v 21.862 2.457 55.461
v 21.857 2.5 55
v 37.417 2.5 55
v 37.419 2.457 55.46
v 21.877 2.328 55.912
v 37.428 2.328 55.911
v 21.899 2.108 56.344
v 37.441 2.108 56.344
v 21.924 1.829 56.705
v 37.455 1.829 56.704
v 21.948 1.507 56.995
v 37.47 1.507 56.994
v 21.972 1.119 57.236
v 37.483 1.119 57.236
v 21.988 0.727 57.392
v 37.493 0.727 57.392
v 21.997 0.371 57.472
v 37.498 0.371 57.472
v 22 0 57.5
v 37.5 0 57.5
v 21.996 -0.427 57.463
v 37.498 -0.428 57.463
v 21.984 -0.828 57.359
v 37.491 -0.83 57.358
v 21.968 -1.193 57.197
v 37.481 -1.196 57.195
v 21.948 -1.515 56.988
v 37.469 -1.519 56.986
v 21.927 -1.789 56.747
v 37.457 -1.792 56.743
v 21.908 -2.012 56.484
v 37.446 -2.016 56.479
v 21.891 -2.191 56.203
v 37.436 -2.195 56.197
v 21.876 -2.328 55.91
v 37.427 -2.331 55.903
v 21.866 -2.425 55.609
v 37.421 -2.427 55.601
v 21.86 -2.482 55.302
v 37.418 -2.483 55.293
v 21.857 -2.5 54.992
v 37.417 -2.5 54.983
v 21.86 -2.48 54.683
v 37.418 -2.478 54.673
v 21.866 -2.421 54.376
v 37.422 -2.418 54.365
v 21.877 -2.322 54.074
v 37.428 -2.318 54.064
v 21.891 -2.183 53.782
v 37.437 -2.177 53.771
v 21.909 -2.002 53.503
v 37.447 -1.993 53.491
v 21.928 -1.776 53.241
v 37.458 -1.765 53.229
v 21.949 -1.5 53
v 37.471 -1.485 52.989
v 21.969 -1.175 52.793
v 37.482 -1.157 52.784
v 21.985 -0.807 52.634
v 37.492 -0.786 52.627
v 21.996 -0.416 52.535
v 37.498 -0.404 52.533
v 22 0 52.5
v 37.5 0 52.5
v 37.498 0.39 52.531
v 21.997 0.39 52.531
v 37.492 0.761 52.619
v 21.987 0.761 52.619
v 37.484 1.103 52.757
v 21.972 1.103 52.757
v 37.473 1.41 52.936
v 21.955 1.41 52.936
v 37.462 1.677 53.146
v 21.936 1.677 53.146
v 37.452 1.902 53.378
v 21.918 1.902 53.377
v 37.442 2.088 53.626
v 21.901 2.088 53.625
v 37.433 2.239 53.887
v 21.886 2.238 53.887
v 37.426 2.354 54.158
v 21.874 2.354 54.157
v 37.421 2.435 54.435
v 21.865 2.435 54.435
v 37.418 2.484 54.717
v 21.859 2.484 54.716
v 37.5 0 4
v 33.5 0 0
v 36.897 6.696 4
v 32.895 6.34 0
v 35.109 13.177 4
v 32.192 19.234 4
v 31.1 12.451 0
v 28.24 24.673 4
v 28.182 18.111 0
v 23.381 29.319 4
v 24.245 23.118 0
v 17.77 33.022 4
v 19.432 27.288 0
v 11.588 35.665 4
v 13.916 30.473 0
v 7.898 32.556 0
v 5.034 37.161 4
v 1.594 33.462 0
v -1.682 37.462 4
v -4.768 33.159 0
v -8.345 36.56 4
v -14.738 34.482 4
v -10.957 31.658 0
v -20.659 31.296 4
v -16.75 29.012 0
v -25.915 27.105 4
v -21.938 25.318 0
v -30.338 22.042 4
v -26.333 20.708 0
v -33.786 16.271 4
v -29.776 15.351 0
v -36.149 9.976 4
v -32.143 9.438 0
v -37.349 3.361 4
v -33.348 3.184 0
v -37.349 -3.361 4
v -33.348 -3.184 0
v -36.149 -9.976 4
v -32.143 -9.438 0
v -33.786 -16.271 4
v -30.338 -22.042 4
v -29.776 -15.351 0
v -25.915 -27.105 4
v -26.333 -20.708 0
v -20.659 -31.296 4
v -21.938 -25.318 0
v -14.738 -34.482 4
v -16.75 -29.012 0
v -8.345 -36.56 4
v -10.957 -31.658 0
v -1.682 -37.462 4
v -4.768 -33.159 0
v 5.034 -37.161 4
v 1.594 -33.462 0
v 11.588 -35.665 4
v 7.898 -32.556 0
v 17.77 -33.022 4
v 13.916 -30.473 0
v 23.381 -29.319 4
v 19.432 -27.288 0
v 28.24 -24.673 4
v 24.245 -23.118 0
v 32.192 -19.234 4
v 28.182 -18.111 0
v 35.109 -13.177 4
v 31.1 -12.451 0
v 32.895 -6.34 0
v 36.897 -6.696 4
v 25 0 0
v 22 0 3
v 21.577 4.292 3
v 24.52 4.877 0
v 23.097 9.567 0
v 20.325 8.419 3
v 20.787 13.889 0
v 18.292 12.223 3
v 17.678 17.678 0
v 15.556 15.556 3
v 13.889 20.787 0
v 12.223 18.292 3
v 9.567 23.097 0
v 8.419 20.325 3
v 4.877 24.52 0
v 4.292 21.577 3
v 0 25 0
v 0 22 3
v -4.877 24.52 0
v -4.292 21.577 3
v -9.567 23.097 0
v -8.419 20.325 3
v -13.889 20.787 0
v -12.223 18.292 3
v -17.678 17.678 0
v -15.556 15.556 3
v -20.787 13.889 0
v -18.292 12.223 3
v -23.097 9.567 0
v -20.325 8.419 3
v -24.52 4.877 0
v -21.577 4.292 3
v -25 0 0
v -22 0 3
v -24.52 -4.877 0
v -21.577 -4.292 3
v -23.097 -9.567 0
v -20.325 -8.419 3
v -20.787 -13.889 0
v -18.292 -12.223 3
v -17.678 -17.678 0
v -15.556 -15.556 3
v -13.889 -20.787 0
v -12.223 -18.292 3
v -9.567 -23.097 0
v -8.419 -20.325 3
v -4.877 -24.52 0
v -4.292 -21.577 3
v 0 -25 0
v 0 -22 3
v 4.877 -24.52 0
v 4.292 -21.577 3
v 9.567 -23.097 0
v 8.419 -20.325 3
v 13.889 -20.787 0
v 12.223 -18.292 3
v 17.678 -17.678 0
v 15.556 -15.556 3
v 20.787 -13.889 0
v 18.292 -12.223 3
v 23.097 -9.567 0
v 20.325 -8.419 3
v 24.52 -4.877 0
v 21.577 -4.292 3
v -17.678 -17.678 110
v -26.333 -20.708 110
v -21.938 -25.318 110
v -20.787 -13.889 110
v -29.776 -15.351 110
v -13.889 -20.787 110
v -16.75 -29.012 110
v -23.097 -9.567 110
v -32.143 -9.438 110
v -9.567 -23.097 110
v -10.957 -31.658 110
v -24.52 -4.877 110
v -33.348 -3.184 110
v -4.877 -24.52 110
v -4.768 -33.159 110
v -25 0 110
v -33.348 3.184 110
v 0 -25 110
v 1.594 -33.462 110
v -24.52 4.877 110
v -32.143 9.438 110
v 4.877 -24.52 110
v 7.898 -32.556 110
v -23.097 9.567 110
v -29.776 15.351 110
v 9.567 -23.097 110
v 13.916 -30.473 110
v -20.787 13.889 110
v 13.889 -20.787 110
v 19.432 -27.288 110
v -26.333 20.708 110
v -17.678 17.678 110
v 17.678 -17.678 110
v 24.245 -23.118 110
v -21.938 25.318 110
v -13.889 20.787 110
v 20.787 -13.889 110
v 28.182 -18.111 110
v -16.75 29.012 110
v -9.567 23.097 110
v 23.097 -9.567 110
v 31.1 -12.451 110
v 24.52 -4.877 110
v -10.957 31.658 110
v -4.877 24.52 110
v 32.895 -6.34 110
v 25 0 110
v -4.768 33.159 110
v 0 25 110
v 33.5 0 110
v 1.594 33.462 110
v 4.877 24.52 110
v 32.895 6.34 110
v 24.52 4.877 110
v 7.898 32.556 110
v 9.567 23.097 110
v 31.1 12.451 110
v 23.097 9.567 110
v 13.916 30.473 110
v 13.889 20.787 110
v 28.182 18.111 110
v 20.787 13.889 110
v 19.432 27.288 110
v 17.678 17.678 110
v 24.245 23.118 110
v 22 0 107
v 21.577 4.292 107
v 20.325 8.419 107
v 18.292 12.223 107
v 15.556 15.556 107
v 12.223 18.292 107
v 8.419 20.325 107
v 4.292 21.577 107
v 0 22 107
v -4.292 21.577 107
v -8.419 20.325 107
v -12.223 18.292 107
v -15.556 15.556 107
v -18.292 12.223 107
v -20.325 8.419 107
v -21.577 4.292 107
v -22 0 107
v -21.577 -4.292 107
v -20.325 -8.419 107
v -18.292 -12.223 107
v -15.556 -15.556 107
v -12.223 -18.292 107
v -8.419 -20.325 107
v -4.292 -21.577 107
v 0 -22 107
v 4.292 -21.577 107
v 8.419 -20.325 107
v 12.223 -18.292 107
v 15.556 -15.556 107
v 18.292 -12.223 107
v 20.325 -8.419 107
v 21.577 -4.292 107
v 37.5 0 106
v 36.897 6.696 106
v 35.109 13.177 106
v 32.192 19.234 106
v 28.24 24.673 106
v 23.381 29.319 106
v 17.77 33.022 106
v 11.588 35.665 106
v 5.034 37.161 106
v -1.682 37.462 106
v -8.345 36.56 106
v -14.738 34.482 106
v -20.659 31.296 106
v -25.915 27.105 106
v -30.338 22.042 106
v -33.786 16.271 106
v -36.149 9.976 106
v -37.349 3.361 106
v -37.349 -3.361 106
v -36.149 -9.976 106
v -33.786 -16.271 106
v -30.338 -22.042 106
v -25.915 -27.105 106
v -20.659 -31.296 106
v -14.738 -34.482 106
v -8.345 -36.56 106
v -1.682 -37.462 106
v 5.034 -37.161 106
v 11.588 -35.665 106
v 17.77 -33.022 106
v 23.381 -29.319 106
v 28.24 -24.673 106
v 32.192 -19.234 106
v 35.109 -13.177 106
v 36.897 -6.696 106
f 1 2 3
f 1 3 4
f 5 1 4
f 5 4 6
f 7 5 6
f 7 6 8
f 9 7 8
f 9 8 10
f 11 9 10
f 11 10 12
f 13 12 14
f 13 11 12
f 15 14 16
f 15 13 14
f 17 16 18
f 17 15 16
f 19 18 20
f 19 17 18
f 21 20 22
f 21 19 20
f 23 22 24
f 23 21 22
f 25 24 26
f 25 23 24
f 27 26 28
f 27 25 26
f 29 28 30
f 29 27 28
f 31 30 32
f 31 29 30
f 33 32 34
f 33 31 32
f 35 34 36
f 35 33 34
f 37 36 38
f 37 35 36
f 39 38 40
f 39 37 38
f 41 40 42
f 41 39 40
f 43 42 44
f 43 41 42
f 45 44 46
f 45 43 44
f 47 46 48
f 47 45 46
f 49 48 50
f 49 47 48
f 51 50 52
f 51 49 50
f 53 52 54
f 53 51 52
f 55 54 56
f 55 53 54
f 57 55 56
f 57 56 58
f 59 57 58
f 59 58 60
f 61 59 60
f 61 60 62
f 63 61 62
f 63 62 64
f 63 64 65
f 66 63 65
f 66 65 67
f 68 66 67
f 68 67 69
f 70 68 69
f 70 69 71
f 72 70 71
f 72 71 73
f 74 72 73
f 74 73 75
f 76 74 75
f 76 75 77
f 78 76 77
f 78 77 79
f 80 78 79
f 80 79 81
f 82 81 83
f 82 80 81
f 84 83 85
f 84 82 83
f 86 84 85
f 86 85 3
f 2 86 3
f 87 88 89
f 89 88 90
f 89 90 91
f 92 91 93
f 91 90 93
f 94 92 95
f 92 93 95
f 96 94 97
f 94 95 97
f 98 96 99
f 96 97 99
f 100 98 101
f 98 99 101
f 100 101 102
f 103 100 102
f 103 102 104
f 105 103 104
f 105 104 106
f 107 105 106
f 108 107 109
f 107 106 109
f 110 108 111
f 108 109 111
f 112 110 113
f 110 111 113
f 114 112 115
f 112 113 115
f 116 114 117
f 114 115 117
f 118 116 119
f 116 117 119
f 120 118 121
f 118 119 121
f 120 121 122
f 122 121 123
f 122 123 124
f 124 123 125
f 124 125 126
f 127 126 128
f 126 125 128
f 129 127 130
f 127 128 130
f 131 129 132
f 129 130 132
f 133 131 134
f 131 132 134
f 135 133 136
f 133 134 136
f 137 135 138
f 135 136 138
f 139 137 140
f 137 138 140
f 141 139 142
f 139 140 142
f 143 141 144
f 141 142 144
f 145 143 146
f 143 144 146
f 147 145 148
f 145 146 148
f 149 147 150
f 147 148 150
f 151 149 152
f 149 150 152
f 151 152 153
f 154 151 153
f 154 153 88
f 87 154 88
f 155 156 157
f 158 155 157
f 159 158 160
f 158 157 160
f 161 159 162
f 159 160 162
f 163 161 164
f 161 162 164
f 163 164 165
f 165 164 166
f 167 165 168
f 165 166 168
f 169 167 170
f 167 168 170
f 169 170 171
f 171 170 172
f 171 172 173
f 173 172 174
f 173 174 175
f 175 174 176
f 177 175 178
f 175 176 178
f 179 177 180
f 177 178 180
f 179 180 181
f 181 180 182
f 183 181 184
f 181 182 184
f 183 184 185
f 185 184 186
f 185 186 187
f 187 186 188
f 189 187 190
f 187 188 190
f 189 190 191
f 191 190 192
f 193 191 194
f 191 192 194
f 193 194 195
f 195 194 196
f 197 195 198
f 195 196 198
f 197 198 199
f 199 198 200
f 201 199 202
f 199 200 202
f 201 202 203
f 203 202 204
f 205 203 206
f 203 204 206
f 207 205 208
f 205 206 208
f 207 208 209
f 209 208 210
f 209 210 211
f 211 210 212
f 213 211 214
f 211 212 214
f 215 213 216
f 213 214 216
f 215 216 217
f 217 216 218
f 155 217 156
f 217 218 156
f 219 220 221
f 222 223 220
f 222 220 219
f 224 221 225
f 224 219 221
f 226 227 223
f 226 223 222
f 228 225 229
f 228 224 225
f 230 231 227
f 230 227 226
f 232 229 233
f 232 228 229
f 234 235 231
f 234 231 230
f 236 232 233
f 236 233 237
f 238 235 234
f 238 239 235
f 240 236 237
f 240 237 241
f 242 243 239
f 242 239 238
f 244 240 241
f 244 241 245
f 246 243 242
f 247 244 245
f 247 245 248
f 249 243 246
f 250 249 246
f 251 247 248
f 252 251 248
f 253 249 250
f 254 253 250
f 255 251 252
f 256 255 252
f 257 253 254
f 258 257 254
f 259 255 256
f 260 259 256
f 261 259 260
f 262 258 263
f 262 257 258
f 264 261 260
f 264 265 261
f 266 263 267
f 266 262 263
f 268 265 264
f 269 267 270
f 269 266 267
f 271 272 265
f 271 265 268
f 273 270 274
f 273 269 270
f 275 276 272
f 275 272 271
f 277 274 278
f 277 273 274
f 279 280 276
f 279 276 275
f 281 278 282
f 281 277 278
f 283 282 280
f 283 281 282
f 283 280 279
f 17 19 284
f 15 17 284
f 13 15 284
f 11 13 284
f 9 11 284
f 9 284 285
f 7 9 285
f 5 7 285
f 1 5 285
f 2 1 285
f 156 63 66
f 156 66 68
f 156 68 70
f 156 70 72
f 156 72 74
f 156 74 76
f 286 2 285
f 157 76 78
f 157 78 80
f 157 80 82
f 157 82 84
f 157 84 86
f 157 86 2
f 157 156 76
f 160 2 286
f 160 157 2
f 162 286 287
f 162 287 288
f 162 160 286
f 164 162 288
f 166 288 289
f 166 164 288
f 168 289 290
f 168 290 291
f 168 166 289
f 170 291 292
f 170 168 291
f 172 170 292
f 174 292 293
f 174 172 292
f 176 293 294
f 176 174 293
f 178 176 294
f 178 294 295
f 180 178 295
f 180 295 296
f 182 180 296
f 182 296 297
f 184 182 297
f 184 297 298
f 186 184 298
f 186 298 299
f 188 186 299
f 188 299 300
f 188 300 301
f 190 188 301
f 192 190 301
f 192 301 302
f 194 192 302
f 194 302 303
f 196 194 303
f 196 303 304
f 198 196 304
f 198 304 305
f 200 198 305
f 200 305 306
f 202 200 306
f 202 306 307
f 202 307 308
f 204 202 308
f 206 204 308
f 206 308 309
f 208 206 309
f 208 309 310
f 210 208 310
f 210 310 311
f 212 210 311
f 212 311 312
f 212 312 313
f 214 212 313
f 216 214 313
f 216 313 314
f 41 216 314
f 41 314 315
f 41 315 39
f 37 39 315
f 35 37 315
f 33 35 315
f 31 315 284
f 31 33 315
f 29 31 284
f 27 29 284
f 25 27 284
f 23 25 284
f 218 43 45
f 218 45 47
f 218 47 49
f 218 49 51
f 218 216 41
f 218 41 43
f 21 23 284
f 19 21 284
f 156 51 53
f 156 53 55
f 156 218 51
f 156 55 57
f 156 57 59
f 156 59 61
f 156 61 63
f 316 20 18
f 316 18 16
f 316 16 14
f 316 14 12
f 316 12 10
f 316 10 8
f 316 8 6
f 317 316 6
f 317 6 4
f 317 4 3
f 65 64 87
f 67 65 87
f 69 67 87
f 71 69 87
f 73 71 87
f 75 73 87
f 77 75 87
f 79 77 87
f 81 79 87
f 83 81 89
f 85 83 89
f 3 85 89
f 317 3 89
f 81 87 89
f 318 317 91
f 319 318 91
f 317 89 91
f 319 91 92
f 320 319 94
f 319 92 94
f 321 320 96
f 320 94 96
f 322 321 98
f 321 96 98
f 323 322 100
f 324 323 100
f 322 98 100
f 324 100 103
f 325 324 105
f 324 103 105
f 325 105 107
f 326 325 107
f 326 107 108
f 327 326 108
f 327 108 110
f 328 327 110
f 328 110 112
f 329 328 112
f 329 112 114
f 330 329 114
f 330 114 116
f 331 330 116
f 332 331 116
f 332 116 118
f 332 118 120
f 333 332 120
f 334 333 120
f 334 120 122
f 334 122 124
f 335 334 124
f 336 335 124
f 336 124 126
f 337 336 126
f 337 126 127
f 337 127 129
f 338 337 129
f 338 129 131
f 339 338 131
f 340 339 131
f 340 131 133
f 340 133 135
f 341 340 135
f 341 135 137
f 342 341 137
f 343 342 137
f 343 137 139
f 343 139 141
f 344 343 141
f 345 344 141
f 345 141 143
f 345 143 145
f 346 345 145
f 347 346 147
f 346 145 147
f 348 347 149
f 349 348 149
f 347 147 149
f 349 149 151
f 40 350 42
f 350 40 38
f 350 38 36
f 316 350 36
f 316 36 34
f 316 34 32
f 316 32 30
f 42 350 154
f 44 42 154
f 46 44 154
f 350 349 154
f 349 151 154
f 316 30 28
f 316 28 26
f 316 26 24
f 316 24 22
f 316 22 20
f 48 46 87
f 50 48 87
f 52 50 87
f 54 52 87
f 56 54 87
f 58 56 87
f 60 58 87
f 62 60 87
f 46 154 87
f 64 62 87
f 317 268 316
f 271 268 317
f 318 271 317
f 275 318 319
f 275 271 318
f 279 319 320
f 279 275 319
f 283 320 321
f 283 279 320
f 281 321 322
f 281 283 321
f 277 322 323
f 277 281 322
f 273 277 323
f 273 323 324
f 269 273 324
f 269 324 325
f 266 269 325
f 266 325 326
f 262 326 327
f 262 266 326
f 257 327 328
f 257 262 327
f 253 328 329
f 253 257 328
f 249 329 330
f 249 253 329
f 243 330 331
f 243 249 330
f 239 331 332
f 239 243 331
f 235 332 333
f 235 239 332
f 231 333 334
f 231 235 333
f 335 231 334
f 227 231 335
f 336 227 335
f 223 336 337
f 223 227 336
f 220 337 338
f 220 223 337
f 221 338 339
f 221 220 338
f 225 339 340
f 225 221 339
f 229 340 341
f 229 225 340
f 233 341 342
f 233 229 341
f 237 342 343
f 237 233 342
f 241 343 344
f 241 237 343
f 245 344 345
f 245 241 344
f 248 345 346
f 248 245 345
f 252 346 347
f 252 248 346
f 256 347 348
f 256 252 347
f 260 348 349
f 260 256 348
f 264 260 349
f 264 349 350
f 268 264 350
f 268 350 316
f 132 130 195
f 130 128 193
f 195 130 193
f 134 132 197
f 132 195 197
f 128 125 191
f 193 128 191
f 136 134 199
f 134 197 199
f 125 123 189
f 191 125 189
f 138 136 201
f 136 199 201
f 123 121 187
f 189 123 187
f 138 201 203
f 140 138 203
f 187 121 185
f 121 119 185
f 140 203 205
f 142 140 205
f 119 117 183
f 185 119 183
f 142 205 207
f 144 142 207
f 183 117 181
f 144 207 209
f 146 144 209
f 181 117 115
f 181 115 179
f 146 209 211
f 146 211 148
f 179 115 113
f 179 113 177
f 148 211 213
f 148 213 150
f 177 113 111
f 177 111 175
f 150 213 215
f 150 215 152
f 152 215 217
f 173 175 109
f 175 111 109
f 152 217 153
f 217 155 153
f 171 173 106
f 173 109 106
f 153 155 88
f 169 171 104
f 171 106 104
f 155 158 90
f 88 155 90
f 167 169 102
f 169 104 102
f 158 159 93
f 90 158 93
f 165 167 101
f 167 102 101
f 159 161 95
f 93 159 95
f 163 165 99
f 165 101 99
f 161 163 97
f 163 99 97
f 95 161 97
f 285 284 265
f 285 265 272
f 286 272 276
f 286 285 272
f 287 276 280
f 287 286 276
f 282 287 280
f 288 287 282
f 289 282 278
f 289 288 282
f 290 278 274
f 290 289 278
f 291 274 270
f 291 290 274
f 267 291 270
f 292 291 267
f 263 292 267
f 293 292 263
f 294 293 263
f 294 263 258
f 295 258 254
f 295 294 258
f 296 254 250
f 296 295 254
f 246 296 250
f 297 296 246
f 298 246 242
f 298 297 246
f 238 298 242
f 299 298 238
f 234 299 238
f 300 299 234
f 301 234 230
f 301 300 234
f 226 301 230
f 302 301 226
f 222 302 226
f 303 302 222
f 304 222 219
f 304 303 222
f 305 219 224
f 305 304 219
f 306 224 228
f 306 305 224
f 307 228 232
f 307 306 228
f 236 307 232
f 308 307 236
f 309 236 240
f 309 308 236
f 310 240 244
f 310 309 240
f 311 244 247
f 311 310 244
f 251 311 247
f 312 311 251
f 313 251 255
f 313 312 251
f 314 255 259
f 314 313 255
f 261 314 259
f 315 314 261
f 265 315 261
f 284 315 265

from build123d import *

# Parameters (mm, degrees)
F0_R     = 37.5
F0_R_2   = 22
F1_DEPTH = 110
F2_SIZE  = 4
F3_SIZE  = 3
F4_R     = 2.5
F5_DEPTH = 38.5000001


with BuildPart() as f1:
    # F0 (on Top) → F1 (new body)
    with BuildSketch(Plane.XY):
        Circle(F0_R)
        Circle(F0_R_2, mode=Mode.SUBTRACT)
    extrude(amount=F1_DEPTH)

    # F2
    f2_edges = [f1.edges().sort_by_distance(p)[0] for p in [
        (-37.5, 0, 110),
        (-37.5, 0, 0),
    ]]
    chamfer(f2_edges, length=F2_SIZE)

    # F3
    f3_edges = [f1.edges().sort_by_distance(p)[0] for p in [
        (-22, 0, 110),
        (-22, 0, 0),
    ]]
    chamfer(f3_edges, length=F3_SIZE)

    # F4 (on Right) → F5 (cut, up to face)
    with BuildSketch(Plane.YZ):
        with Locations((0, 55)):
            Circle(F4_R)
    extrude(amount=F5_DEPTH, mode=Mode.SUBTRACT)


solid = f1.part
